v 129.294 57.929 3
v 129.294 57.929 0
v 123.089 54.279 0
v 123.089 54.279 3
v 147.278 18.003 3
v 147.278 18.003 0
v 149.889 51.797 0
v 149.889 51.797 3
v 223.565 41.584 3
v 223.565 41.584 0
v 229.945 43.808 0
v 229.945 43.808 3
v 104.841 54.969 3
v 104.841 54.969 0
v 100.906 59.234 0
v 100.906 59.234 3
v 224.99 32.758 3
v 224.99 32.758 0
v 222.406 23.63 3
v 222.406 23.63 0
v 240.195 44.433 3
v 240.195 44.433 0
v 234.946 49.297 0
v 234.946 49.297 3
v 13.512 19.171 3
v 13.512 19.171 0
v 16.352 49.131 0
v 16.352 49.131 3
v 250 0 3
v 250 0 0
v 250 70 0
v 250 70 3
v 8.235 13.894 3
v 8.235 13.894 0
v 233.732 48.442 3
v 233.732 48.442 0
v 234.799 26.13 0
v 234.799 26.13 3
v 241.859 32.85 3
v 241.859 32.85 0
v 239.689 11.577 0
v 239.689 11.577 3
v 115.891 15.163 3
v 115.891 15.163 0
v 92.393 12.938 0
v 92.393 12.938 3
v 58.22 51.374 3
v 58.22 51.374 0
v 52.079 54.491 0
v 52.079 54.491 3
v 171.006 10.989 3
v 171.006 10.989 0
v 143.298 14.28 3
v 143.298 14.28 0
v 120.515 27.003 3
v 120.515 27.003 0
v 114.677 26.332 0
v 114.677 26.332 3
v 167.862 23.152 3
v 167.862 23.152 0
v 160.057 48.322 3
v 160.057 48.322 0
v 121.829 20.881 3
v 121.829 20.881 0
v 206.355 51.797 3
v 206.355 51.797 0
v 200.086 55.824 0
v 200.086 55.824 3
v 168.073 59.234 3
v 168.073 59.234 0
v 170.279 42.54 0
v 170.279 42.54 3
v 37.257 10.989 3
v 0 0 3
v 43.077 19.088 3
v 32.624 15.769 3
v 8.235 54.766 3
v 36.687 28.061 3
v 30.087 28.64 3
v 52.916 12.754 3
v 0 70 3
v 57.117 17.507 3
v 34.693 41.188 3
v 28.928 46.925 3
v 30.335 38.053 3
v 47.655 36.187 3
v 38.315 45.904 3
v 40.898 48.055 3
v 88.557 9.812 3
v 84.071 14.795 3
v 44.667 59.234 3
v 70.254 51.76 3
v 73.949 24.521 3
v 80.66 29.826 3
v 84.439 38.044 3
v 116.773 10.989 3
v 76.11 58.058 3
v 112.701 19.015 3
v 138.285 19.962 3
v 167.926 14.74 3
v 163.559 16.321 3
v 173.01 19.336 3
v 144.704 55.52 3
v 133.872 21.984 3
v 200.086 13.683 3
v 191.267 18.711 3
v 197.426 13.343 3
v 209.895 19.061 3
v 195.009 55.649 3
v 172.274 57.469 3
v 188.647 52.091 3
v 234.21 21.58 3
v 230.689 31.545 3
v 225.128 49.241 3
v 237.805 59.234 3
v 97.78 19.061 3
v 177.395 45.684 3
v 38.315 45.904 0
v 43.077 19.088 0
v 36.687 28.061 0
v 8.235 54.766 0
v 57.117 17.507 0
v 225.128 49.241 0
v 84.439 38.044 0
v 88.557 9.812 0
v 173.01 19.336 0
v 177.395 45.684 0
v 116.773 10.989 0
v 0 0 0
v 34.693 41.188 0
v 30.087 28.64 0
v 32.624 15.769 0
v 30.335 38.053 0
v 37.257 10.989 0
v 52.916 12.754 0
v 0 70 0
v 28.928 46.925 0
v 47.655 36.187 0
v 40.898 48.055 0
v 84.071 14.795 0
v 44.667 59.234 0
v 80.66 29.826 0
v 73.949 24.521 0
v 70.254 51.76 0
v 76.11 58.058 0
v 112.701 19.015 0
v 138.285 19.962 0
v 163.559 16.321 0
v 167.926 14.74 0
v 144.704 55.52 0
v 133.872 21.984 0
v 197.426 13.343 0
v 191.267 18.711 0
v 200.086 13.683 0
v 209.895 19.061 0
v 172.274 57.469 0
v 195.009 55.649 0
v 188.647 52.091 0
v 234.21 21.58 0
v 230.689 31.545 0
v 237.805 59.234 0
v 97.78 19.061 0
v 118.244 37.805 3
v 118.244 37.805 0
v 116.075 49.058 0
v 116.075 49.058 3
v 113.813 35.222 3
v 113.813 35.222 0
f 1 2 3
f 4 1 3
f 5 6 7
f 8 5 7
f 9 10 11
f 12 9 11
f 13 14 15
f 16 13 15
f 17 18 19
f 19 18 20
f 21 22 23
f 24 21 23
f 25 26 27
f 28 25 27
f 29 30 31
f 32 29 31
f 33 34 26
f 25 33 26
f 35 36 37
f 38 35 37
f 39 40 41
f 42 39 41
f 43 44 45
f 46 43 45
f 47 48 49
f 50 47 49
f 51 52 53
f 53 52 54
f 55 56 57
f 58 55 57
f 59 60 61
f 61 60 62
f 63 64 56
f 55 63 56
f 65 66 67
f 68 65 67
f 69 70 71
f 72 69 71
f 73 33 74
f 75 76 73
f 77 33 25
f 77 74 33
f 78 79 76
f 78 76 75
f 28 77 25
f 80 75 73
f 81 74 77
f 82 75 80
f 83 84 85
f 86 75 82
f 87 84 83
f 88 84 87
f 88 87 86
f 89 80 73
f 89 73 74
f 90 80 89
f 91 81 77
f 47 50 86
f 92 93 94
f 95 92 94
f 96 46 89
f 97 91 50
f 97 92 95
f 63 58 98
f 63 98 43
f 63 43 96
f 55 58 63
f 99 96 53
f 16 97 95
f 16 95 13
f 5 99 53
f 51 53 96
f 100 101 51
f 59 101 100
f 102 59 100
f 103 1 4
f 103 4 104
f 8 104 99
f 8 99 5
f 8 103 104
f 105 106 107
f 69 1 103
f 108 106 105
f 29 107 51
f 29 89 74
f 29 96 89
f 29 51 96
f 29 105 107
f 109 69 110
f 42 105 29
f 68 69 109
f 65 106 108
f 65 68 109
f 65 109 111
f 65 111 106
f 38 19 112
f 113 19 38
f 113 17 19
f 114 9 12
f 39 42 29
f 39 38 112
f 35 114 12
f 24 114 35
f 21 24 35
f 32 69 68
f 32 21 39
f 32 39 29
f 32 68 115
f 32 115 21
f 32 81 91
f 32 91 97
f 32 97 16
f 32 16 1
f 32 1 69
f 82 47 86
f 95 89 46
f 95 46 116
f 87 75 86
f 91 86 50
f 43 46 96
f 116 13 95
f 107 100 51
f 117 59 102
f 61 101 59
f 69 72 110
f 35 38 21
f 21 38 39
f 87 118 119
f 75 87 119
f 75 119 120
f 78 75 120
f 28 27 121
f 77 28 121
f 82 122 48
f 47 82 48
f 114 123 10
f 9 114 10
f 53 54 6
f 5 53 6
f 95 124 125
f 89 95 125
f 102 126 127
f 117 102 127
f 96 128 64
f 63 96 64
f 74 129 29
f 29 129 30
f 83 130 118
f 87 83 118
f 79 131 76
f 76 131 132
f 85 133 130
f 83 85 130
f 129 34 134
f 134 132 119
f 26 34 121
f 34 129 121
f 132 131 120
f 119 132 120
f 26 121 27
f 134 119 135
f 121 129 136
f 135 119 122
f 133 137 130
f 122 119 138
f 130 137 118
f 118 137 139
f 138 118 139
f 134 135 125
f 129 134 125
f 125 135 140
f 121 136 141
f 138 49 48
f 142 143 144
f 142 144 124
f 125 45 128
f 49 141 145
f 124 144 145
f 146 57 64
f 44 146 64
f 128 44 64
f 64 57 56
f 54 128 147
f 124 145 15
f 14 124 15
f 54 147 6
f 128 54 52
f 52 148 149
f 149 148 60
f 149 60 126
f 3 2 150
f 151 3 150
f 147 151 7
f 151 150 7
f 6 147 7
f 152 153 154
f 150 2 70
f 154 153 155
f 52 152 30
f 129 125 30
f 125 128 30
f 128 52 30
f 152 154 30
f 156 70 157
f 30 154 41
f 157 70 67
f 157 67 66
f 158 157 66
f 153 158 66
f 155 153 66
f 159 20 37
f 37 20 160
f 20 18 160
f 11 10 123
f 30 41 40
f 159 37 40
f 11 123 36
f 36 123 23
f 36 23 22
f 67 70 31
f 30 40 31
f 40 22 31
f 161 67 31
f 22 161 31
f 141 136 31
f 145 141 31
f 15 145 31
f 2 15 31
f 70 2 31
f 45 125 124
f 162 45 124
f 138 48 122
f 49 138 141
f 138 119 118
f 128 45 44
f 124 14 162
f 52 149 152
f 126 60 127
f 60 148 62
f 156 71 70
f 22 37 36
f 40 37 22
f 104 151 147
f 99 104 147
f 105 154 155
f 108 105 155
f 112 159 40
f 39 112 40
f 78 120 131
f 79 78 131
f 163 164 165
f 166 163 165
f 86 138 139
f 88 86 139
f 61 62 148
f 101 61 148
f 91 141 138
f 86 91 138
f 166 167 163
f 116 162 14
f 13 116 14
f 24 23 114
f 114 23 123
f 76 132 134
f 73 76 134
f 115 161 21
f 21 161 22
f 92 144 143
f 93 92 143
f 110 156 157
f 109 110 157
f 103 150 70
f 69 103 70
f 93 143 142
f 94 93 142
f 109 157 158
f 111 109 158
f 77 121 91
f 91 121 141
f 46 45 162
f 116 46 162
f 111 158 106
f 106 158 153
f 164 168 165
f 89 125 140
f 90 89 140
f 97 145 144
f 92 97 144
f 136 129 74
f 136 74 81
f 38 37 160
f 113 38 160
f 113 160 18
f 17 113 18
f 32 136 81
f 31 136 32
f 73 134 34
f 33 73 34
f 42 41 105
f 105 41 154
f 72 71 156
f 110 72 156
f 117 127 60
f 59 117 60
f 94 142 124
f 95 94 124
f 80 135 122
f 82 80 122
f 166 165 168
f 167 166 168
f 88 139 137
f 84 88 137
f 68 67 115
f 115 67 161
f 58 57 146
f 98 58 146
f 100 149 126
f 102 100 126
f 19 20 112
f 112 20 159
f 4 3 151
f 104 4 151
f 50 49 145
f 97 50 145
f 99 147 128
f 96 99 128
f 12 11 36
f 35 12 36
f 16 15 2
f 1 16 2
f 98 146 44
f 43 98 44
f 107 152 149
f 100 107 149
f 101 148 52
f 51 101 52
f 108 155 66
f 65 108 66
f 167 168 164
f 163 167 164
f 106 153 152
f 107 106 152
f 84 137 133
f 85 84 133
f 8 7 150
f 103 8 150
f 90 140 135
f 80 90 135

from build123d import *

# Parameters (mm, degrees)
SKETCH2_W           = 250
SKETCH2_H           = 70
BOSS_EXTRUDE2_DEPTH = 3
CUT_EXTRUDE1_DEPTH  = 25


with BuildPart() as part:
    # Sketch2 → Boss-Extrude2 (new body)
    with BuildSketch(Plane.XY):
        with Locations((125, 35)):
            Rectangle(SKETCH2_W, SKETCH2_H)
    extrude(amount=BOSS_EXTRUDE2_DEPTH)

    # Sketch1 → Cut-Extrude1 (cut)
    # profile 1 of 5: a face of its own
    with BuildSketch(Plane.XY):
        Polygon((47.65472561, 36.187258524), (40.89783515, 48.055483808), (28.928486336, 46.924738874), (30.335022717, 38.053447318), (34.692527585, 41.188276769), (38.314588593, 45.904310519), (43.076587584, 19.088188789), (36.687419054, 28.060603876), (30.086810414, 28.639765915), (32.62409173, 15.769498373), (37.257388045, 10.989113286), (8.234934737, 13.894116531), (13.511744429, 19.170926223), (16.352396337, 49.131070452), (8.234934737, 54.766409026), (44.66698493, 59.234230473), align=None)
    # profile 2 of 5: a face of its own
    with BuildSketch(Plane.XY):
        Polygon((88.557171303, 9.81240311), (84.07096376, 14.795035259), (52.915723259, 12.754178549), (57.116946307, 17.506984491), (58.220112096, 51.374174224), (52.079155869, 54.490617579), (76.10978398, 58.057520298), (70.253812248, 51.76028225), (73.949417643, 24.521280302), (80.660342861, 29.825669139), (84.43868569, 38.04425427), align=None)
    # profile 3 of 5: a face of its own
    with BuildSketch(Plane.XY):
        Polygon((138.284943312, 19.961528372), (116.773210419, 10.989113286), (121.829386954, 20.880833197), (120.514781055, 27.003403328), (114.67719542, 26.332310806), (112.700690047, 19.014644403), (115.890677788, 15.162757189), (92.393246475, 12.938039514), (97.780372746, 19.060609645), (104.840633798, 54.968656088), (100.906009149, 59.234230473), (129.294142129, 57.928817623), (123.088834563, 54.279177469), (133.872280154, 21.983998986), align=None)
        Polygon((118.244098139, 37.805235015), (116.074538753, 49.057526067), (113.813048885, 35.221988458), align=None, mode=Mode.SUBTRACT)
    # profile 4 of 5: a face of its own
    with BuildSketch(Plane.XY):
        Polygon((197.426396723, 13.342533636), (167.925904906, 14.73987697), (173.009660585, 19.336401092), (177.394744598, 45.683677361), (167.861553568, 23.151516113), (160.056655608, 48.322082207), (163.55920699, 16.321081268), (171.005576068, 10.989113286), (143.297728659, 14.280224557), (147.278318548, 18.003409096), (149.88914425, 51.797054443), (144.70426504, 55.520238982), (168.072993678, 59.234230473), (170.279325256, 42.539654861), (172.274216725, 57.46916521), (195.008625034, 55.648941658), (188.647035649, 52.091231987), (191.267054399, 18.711273811), align=None)
    # profile 5 of 5: a face of its own
    with BuildSketch(Plane.XY):
        Polygon((241.858972942, 32.850182011), (239.689413556, 11.577468373), (200.085761719, 13.682676421), (209.894744196, 19.060609645), (206.355420622, 51.797054443), (200.085761719, 55.823609575), (237.804838666, 59.234230473), (240.19503121, 44.4334228), (234.945800662, 49.296545321), (225.127625137, 49.241387031), (223.564806935, 41.583577844), (229.944782417, 43.808295519), (233.732318294, 48.441591834), (234.79871189, 26.130063745), (230.689419325, 31.544769161), (224.989729413, 32.758251529), (222.406482857, 23.629554622), (234.210356803, 21.579504864), align=None)
    extrude(amount=CUT_EXTRUDE1_DEPTH, mode=Mode.SUBTRACT)


with BuildPart() as cut_extrude1_piece_1:
    # of the separate pieces the step leaves, piece 1, a body of its own (cut_extrude1_pieces)
    add(part.part.solids().sort_by_distance((0, 0, 0))[0])


with BuildPart() as cut_extrude1_piece_2:
    # of the separate pieces the step leaves, piece 2, a body of its own (cut_extrude1_pieces)
    add(part.part.solids().sort_by_distance((113.813048885, 35.221988458, 0))[0])


solid = Compound([cut_extrude1_piece_1.part, cut_extrude1_piece_2.part])
